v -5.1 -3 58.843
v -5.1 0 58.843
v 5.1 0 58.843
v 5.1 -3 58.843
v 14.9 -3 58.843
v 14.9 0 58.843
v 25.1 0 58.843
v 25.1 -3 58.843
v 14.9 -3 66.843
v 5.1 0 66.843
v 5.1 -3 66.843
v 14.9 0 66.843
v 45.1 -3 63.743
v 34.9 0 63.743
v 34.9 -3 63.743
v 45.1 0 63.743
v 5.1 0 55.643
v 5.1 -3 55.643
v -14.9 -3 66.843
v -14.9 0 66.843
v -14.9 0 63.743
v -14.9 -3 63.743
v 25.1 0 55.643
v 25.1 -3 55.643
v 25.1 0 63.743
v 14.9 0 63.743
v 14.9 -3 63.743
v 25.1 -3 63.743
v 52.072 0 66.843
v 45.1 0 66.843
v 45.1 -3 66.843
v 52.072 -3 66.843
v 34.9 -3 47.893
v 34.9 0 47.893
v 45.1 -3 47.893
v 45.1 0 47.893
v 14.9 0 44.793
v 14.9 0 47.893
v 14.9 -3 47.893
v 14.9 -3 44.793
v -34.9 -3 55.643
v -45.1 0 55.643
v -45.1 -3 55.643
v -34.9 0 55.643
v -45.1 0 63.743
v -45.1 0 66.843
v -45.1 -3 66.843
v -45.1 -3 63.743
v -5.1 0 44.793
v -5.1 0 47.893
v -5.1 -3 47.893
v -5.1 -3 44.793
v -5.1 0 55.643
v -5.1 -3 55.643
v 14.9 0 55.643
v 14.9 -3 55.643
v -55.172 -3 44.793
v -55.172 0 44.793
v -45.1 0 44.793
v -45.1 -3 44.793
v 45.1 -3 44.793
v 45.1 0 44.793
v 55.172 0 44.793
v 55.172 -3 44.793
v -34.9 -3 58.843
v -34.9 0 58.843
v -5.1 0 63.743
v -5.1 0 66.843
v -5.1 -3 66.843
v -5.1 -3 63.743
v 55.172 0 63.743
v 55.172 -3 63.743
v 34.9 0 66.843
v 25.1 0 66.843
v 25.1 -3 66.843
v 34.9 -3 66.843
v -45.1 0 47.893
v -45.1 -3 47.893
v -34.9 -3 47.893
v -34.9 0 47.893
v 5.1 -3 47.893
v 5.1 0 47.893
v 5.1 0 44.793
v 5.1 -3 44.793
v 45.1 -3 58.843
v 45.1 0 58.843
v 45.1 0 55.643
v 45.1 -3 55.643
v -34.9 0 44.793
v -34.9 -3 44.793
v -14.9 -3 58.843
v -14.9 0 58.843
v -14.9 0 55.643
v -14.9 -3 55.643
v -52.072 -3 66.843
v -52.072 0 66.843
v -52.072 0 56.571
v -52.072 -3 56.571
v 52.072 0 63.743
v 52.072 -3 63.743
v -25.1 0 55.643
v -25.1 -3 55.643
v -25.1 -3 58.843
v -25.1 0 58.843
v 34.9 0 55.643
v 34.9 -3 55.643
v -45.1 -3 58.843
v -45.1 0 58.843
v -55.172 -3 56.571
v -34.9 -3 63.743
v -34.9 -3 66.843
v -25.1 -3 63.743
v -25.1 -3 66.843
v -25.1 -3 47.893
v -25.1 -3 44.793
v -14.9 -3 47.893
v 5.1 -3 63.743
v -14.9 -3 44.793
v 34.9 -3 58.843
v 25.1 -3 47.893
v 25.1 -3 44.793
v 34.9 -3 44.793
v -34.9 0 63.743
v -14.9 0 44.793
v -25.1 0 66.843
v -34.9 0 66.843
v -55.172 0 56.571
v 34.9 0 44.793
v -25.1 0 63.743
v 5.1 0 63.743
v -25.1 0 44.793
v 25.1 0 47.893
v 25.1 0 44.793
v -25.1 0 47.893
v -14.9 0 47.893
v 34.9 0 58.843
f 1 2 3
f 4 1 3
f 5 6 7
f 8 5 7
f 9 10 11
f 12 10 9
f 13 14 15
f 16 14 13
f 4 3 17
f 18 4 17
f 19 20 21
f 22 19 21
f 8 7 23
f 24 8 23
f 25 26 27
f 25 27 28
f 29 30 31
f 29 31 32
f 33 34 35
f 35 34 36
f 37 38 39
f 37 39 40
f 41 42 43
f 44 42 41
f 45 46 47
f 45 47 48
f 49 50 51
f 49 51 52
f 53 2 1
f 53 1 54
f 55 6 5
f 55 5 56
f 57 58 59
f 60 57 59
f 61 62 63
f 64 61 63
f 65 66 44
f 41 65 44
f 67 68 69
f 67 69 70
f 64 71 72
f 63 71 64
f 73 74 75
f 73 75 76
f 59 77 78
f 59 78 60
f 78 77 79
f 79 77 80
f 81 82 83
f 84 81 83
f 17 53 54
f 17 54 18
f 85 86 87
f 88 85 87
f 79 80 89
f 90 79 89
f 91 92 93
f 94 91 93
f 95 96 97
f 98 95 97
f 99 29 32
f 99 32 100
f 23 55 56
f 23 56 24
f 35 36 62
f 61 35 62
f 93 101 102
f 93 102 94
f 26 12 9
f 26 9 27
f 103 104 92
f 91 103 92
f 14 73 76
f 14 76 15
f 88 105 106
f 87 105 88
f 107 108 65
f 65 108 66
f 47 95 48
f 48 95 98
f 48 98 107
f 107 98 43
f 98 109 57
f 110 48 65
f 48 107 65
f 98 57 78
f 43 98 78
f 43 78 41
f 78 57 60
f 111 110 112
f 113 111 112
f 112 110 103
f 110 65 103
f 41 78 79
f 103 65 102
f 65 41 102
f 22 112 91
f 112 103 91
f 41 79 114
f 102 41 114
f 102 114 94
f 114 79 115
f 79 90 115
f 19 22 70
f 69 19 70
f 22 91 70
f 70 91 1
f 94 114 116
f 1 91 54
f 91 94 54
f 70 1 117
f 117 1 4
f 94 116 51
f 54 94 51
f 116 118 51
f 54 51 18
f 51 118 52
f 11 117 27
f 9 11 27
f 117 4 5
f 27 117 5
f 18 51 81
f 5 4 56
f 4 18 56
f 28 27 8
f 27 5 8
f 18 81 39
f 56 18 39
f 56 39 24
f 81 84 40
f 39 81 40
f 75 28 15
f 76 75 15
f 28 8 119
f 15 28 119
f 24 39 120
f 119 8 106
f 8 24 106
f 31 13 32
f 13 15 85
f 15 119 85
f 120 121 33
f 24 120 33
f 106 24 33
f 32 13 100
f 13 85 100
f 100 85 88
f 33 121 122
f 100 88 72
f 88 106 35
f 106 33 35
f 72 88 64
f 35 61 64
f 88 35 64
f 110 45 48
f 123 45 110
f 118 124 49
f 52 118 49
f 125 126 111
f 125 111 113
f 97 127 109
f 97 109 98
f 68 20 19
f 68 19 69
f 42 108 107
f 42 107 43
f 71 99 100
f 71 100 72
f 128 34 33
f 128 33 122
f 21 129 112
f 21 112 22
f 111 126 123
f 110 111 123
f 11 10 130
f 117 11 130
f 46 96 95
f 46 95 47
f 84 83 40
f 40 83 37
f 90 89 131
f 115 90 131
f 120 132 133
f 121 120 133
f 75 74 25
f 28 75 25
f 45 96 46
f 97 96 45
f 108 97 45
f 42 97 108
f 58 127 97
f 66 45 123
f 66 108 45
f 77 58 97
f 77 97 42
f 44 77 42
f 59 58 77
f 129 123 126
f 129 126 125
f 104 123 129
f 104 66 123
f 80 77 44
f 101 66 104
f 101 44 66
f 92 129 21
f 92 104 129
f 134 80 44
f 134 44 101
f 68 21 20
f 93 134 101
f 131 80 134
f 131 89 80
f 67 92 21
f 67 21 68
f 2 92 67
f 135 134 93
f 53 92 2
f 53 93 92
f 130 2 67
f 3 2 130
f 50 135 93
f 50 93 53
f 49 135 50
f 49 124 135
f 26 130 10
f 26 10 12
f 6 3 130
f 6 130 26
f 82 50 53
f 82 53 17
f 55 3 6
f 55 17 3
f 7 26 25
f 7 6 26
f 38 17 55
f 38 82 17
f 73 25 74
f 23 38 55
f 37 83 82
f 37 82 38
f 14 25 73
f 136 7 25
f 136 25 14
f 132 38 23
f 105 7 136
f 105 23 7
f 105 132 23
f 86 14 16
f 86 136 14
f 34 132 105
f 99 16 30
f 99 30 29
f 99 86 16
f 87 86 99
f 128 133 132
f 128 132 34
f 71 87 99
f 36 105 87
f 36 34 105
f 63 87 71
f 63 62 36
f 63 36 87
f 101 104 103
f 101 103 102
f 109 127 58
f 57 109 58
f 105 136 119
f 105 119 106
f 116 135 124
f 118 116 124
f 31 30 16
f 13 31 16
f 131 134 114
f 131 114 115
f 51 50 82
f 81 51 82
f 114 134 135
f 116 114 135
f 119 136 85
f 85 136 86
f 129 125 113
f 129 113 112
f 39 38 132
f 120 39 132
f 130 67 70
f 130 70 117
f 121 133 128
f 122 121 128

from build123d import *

# Parameters (mm, degrees)
SKETCH1_W           = 110.344434204
SKETCH1_H           = 22.05
BOSS_EXTRUDE1_DEPTH = 3
SKETCH3_W           = 10.2
SKETCH3_H           = 3.2
SKETCH3_W_2         = 3.2
SKETCH3_H_2         = 10.372217102
CUT_EXTRUDE1_DEPTH  = 4


with BuildPart() as part:
    # Sketch1 → Boss-Extrude1 (new body)
    with BuildSketch(Plane(origin=(0, 0, 0), x_dir=(1, 0, 0), z_dir=(0, 1, 0))):
        with Locations((0, -55.817990858)):
            Rectangle(SKETCH1_W, SKETCH1_H)
    extrude(amount=-BOSS_EXTRUDE1_DEPTH)

    # Sketch3 → Cut-Extrude1 (cut, through all)
    with BuildSketch(Plane(origin=(0, 0, 0), x_dir=(1, 0, 0), z_dir=(0, 1, 0))):
        with Locations((-40, -46.292990858)):
            Rectangle(SKETCH3_W, SKETCH3_H)
        with Locations((-53.672217102, -61.756882307)):
            Rectangle(SKETCH3_W_2, SKETCH3_H_2)
        with Locations((53.672217102, -65.342990858)):
            Rectangle(SKETCH3_W_2, SKETCH3_H)
        with Locations((-40, -65.342990858)):
            Rectangle(SKETCH3_W, SKETCH3_H)
        with Locations((-20, -46.292990858)):
            Rectangle(SKETCH3_W, SKETCH3_H)
        with Locations((-20, -65.342990858)):
            Rectangle(SKETCH3_W, SKETCH3_H)
        with Locations((0, -46.292990858)):
            Rectangle(SKETCH3_W, SKETCH3_H)
        with Locations((0, -65.342990858)):
            Rectangle(SKETCH3_W, SKETCH3_H)
        with Locations((20, -46.292990858)):
            Rectangle(SKETCH3_W, SKETCH3_H)
        with Locations((20, -65.342990858)):
            Rectangle(SKETCH3_W, SKETCH3_H)
        with Locations((40, -46.292990858)):
            Rectangle(SKETCH3_W, SKETCH3_H)
        with Locations((40, -65.342990858)):
            Rectangle(SKETCH3_W, SKETCH3_H)
        with Locations((-40, -57.242990858)):
            Rectangle(SKETCH3_W, SKETCH3_H)
        with Locations((40, -57.242990858)):
            Rectangle(SKETCH3_W, SKETCH3_H)
        with Locations((-20, -57.242990858)):
            Rectangle(SKETCH3_W, SKETCH3_H)
        with Locations((20, -57.242990858)):
            Rectangle(SKETCH3_W, SKETCH3_H)
        with Locations((0, -57.242990858)):
            Rectangle(SKETCH3_W, SKETCH3_H)
    extrude(amount=-CUT_EXTRUDE1_DEPTH, mode=Mode.SUBTRACT)


solid = part.part
